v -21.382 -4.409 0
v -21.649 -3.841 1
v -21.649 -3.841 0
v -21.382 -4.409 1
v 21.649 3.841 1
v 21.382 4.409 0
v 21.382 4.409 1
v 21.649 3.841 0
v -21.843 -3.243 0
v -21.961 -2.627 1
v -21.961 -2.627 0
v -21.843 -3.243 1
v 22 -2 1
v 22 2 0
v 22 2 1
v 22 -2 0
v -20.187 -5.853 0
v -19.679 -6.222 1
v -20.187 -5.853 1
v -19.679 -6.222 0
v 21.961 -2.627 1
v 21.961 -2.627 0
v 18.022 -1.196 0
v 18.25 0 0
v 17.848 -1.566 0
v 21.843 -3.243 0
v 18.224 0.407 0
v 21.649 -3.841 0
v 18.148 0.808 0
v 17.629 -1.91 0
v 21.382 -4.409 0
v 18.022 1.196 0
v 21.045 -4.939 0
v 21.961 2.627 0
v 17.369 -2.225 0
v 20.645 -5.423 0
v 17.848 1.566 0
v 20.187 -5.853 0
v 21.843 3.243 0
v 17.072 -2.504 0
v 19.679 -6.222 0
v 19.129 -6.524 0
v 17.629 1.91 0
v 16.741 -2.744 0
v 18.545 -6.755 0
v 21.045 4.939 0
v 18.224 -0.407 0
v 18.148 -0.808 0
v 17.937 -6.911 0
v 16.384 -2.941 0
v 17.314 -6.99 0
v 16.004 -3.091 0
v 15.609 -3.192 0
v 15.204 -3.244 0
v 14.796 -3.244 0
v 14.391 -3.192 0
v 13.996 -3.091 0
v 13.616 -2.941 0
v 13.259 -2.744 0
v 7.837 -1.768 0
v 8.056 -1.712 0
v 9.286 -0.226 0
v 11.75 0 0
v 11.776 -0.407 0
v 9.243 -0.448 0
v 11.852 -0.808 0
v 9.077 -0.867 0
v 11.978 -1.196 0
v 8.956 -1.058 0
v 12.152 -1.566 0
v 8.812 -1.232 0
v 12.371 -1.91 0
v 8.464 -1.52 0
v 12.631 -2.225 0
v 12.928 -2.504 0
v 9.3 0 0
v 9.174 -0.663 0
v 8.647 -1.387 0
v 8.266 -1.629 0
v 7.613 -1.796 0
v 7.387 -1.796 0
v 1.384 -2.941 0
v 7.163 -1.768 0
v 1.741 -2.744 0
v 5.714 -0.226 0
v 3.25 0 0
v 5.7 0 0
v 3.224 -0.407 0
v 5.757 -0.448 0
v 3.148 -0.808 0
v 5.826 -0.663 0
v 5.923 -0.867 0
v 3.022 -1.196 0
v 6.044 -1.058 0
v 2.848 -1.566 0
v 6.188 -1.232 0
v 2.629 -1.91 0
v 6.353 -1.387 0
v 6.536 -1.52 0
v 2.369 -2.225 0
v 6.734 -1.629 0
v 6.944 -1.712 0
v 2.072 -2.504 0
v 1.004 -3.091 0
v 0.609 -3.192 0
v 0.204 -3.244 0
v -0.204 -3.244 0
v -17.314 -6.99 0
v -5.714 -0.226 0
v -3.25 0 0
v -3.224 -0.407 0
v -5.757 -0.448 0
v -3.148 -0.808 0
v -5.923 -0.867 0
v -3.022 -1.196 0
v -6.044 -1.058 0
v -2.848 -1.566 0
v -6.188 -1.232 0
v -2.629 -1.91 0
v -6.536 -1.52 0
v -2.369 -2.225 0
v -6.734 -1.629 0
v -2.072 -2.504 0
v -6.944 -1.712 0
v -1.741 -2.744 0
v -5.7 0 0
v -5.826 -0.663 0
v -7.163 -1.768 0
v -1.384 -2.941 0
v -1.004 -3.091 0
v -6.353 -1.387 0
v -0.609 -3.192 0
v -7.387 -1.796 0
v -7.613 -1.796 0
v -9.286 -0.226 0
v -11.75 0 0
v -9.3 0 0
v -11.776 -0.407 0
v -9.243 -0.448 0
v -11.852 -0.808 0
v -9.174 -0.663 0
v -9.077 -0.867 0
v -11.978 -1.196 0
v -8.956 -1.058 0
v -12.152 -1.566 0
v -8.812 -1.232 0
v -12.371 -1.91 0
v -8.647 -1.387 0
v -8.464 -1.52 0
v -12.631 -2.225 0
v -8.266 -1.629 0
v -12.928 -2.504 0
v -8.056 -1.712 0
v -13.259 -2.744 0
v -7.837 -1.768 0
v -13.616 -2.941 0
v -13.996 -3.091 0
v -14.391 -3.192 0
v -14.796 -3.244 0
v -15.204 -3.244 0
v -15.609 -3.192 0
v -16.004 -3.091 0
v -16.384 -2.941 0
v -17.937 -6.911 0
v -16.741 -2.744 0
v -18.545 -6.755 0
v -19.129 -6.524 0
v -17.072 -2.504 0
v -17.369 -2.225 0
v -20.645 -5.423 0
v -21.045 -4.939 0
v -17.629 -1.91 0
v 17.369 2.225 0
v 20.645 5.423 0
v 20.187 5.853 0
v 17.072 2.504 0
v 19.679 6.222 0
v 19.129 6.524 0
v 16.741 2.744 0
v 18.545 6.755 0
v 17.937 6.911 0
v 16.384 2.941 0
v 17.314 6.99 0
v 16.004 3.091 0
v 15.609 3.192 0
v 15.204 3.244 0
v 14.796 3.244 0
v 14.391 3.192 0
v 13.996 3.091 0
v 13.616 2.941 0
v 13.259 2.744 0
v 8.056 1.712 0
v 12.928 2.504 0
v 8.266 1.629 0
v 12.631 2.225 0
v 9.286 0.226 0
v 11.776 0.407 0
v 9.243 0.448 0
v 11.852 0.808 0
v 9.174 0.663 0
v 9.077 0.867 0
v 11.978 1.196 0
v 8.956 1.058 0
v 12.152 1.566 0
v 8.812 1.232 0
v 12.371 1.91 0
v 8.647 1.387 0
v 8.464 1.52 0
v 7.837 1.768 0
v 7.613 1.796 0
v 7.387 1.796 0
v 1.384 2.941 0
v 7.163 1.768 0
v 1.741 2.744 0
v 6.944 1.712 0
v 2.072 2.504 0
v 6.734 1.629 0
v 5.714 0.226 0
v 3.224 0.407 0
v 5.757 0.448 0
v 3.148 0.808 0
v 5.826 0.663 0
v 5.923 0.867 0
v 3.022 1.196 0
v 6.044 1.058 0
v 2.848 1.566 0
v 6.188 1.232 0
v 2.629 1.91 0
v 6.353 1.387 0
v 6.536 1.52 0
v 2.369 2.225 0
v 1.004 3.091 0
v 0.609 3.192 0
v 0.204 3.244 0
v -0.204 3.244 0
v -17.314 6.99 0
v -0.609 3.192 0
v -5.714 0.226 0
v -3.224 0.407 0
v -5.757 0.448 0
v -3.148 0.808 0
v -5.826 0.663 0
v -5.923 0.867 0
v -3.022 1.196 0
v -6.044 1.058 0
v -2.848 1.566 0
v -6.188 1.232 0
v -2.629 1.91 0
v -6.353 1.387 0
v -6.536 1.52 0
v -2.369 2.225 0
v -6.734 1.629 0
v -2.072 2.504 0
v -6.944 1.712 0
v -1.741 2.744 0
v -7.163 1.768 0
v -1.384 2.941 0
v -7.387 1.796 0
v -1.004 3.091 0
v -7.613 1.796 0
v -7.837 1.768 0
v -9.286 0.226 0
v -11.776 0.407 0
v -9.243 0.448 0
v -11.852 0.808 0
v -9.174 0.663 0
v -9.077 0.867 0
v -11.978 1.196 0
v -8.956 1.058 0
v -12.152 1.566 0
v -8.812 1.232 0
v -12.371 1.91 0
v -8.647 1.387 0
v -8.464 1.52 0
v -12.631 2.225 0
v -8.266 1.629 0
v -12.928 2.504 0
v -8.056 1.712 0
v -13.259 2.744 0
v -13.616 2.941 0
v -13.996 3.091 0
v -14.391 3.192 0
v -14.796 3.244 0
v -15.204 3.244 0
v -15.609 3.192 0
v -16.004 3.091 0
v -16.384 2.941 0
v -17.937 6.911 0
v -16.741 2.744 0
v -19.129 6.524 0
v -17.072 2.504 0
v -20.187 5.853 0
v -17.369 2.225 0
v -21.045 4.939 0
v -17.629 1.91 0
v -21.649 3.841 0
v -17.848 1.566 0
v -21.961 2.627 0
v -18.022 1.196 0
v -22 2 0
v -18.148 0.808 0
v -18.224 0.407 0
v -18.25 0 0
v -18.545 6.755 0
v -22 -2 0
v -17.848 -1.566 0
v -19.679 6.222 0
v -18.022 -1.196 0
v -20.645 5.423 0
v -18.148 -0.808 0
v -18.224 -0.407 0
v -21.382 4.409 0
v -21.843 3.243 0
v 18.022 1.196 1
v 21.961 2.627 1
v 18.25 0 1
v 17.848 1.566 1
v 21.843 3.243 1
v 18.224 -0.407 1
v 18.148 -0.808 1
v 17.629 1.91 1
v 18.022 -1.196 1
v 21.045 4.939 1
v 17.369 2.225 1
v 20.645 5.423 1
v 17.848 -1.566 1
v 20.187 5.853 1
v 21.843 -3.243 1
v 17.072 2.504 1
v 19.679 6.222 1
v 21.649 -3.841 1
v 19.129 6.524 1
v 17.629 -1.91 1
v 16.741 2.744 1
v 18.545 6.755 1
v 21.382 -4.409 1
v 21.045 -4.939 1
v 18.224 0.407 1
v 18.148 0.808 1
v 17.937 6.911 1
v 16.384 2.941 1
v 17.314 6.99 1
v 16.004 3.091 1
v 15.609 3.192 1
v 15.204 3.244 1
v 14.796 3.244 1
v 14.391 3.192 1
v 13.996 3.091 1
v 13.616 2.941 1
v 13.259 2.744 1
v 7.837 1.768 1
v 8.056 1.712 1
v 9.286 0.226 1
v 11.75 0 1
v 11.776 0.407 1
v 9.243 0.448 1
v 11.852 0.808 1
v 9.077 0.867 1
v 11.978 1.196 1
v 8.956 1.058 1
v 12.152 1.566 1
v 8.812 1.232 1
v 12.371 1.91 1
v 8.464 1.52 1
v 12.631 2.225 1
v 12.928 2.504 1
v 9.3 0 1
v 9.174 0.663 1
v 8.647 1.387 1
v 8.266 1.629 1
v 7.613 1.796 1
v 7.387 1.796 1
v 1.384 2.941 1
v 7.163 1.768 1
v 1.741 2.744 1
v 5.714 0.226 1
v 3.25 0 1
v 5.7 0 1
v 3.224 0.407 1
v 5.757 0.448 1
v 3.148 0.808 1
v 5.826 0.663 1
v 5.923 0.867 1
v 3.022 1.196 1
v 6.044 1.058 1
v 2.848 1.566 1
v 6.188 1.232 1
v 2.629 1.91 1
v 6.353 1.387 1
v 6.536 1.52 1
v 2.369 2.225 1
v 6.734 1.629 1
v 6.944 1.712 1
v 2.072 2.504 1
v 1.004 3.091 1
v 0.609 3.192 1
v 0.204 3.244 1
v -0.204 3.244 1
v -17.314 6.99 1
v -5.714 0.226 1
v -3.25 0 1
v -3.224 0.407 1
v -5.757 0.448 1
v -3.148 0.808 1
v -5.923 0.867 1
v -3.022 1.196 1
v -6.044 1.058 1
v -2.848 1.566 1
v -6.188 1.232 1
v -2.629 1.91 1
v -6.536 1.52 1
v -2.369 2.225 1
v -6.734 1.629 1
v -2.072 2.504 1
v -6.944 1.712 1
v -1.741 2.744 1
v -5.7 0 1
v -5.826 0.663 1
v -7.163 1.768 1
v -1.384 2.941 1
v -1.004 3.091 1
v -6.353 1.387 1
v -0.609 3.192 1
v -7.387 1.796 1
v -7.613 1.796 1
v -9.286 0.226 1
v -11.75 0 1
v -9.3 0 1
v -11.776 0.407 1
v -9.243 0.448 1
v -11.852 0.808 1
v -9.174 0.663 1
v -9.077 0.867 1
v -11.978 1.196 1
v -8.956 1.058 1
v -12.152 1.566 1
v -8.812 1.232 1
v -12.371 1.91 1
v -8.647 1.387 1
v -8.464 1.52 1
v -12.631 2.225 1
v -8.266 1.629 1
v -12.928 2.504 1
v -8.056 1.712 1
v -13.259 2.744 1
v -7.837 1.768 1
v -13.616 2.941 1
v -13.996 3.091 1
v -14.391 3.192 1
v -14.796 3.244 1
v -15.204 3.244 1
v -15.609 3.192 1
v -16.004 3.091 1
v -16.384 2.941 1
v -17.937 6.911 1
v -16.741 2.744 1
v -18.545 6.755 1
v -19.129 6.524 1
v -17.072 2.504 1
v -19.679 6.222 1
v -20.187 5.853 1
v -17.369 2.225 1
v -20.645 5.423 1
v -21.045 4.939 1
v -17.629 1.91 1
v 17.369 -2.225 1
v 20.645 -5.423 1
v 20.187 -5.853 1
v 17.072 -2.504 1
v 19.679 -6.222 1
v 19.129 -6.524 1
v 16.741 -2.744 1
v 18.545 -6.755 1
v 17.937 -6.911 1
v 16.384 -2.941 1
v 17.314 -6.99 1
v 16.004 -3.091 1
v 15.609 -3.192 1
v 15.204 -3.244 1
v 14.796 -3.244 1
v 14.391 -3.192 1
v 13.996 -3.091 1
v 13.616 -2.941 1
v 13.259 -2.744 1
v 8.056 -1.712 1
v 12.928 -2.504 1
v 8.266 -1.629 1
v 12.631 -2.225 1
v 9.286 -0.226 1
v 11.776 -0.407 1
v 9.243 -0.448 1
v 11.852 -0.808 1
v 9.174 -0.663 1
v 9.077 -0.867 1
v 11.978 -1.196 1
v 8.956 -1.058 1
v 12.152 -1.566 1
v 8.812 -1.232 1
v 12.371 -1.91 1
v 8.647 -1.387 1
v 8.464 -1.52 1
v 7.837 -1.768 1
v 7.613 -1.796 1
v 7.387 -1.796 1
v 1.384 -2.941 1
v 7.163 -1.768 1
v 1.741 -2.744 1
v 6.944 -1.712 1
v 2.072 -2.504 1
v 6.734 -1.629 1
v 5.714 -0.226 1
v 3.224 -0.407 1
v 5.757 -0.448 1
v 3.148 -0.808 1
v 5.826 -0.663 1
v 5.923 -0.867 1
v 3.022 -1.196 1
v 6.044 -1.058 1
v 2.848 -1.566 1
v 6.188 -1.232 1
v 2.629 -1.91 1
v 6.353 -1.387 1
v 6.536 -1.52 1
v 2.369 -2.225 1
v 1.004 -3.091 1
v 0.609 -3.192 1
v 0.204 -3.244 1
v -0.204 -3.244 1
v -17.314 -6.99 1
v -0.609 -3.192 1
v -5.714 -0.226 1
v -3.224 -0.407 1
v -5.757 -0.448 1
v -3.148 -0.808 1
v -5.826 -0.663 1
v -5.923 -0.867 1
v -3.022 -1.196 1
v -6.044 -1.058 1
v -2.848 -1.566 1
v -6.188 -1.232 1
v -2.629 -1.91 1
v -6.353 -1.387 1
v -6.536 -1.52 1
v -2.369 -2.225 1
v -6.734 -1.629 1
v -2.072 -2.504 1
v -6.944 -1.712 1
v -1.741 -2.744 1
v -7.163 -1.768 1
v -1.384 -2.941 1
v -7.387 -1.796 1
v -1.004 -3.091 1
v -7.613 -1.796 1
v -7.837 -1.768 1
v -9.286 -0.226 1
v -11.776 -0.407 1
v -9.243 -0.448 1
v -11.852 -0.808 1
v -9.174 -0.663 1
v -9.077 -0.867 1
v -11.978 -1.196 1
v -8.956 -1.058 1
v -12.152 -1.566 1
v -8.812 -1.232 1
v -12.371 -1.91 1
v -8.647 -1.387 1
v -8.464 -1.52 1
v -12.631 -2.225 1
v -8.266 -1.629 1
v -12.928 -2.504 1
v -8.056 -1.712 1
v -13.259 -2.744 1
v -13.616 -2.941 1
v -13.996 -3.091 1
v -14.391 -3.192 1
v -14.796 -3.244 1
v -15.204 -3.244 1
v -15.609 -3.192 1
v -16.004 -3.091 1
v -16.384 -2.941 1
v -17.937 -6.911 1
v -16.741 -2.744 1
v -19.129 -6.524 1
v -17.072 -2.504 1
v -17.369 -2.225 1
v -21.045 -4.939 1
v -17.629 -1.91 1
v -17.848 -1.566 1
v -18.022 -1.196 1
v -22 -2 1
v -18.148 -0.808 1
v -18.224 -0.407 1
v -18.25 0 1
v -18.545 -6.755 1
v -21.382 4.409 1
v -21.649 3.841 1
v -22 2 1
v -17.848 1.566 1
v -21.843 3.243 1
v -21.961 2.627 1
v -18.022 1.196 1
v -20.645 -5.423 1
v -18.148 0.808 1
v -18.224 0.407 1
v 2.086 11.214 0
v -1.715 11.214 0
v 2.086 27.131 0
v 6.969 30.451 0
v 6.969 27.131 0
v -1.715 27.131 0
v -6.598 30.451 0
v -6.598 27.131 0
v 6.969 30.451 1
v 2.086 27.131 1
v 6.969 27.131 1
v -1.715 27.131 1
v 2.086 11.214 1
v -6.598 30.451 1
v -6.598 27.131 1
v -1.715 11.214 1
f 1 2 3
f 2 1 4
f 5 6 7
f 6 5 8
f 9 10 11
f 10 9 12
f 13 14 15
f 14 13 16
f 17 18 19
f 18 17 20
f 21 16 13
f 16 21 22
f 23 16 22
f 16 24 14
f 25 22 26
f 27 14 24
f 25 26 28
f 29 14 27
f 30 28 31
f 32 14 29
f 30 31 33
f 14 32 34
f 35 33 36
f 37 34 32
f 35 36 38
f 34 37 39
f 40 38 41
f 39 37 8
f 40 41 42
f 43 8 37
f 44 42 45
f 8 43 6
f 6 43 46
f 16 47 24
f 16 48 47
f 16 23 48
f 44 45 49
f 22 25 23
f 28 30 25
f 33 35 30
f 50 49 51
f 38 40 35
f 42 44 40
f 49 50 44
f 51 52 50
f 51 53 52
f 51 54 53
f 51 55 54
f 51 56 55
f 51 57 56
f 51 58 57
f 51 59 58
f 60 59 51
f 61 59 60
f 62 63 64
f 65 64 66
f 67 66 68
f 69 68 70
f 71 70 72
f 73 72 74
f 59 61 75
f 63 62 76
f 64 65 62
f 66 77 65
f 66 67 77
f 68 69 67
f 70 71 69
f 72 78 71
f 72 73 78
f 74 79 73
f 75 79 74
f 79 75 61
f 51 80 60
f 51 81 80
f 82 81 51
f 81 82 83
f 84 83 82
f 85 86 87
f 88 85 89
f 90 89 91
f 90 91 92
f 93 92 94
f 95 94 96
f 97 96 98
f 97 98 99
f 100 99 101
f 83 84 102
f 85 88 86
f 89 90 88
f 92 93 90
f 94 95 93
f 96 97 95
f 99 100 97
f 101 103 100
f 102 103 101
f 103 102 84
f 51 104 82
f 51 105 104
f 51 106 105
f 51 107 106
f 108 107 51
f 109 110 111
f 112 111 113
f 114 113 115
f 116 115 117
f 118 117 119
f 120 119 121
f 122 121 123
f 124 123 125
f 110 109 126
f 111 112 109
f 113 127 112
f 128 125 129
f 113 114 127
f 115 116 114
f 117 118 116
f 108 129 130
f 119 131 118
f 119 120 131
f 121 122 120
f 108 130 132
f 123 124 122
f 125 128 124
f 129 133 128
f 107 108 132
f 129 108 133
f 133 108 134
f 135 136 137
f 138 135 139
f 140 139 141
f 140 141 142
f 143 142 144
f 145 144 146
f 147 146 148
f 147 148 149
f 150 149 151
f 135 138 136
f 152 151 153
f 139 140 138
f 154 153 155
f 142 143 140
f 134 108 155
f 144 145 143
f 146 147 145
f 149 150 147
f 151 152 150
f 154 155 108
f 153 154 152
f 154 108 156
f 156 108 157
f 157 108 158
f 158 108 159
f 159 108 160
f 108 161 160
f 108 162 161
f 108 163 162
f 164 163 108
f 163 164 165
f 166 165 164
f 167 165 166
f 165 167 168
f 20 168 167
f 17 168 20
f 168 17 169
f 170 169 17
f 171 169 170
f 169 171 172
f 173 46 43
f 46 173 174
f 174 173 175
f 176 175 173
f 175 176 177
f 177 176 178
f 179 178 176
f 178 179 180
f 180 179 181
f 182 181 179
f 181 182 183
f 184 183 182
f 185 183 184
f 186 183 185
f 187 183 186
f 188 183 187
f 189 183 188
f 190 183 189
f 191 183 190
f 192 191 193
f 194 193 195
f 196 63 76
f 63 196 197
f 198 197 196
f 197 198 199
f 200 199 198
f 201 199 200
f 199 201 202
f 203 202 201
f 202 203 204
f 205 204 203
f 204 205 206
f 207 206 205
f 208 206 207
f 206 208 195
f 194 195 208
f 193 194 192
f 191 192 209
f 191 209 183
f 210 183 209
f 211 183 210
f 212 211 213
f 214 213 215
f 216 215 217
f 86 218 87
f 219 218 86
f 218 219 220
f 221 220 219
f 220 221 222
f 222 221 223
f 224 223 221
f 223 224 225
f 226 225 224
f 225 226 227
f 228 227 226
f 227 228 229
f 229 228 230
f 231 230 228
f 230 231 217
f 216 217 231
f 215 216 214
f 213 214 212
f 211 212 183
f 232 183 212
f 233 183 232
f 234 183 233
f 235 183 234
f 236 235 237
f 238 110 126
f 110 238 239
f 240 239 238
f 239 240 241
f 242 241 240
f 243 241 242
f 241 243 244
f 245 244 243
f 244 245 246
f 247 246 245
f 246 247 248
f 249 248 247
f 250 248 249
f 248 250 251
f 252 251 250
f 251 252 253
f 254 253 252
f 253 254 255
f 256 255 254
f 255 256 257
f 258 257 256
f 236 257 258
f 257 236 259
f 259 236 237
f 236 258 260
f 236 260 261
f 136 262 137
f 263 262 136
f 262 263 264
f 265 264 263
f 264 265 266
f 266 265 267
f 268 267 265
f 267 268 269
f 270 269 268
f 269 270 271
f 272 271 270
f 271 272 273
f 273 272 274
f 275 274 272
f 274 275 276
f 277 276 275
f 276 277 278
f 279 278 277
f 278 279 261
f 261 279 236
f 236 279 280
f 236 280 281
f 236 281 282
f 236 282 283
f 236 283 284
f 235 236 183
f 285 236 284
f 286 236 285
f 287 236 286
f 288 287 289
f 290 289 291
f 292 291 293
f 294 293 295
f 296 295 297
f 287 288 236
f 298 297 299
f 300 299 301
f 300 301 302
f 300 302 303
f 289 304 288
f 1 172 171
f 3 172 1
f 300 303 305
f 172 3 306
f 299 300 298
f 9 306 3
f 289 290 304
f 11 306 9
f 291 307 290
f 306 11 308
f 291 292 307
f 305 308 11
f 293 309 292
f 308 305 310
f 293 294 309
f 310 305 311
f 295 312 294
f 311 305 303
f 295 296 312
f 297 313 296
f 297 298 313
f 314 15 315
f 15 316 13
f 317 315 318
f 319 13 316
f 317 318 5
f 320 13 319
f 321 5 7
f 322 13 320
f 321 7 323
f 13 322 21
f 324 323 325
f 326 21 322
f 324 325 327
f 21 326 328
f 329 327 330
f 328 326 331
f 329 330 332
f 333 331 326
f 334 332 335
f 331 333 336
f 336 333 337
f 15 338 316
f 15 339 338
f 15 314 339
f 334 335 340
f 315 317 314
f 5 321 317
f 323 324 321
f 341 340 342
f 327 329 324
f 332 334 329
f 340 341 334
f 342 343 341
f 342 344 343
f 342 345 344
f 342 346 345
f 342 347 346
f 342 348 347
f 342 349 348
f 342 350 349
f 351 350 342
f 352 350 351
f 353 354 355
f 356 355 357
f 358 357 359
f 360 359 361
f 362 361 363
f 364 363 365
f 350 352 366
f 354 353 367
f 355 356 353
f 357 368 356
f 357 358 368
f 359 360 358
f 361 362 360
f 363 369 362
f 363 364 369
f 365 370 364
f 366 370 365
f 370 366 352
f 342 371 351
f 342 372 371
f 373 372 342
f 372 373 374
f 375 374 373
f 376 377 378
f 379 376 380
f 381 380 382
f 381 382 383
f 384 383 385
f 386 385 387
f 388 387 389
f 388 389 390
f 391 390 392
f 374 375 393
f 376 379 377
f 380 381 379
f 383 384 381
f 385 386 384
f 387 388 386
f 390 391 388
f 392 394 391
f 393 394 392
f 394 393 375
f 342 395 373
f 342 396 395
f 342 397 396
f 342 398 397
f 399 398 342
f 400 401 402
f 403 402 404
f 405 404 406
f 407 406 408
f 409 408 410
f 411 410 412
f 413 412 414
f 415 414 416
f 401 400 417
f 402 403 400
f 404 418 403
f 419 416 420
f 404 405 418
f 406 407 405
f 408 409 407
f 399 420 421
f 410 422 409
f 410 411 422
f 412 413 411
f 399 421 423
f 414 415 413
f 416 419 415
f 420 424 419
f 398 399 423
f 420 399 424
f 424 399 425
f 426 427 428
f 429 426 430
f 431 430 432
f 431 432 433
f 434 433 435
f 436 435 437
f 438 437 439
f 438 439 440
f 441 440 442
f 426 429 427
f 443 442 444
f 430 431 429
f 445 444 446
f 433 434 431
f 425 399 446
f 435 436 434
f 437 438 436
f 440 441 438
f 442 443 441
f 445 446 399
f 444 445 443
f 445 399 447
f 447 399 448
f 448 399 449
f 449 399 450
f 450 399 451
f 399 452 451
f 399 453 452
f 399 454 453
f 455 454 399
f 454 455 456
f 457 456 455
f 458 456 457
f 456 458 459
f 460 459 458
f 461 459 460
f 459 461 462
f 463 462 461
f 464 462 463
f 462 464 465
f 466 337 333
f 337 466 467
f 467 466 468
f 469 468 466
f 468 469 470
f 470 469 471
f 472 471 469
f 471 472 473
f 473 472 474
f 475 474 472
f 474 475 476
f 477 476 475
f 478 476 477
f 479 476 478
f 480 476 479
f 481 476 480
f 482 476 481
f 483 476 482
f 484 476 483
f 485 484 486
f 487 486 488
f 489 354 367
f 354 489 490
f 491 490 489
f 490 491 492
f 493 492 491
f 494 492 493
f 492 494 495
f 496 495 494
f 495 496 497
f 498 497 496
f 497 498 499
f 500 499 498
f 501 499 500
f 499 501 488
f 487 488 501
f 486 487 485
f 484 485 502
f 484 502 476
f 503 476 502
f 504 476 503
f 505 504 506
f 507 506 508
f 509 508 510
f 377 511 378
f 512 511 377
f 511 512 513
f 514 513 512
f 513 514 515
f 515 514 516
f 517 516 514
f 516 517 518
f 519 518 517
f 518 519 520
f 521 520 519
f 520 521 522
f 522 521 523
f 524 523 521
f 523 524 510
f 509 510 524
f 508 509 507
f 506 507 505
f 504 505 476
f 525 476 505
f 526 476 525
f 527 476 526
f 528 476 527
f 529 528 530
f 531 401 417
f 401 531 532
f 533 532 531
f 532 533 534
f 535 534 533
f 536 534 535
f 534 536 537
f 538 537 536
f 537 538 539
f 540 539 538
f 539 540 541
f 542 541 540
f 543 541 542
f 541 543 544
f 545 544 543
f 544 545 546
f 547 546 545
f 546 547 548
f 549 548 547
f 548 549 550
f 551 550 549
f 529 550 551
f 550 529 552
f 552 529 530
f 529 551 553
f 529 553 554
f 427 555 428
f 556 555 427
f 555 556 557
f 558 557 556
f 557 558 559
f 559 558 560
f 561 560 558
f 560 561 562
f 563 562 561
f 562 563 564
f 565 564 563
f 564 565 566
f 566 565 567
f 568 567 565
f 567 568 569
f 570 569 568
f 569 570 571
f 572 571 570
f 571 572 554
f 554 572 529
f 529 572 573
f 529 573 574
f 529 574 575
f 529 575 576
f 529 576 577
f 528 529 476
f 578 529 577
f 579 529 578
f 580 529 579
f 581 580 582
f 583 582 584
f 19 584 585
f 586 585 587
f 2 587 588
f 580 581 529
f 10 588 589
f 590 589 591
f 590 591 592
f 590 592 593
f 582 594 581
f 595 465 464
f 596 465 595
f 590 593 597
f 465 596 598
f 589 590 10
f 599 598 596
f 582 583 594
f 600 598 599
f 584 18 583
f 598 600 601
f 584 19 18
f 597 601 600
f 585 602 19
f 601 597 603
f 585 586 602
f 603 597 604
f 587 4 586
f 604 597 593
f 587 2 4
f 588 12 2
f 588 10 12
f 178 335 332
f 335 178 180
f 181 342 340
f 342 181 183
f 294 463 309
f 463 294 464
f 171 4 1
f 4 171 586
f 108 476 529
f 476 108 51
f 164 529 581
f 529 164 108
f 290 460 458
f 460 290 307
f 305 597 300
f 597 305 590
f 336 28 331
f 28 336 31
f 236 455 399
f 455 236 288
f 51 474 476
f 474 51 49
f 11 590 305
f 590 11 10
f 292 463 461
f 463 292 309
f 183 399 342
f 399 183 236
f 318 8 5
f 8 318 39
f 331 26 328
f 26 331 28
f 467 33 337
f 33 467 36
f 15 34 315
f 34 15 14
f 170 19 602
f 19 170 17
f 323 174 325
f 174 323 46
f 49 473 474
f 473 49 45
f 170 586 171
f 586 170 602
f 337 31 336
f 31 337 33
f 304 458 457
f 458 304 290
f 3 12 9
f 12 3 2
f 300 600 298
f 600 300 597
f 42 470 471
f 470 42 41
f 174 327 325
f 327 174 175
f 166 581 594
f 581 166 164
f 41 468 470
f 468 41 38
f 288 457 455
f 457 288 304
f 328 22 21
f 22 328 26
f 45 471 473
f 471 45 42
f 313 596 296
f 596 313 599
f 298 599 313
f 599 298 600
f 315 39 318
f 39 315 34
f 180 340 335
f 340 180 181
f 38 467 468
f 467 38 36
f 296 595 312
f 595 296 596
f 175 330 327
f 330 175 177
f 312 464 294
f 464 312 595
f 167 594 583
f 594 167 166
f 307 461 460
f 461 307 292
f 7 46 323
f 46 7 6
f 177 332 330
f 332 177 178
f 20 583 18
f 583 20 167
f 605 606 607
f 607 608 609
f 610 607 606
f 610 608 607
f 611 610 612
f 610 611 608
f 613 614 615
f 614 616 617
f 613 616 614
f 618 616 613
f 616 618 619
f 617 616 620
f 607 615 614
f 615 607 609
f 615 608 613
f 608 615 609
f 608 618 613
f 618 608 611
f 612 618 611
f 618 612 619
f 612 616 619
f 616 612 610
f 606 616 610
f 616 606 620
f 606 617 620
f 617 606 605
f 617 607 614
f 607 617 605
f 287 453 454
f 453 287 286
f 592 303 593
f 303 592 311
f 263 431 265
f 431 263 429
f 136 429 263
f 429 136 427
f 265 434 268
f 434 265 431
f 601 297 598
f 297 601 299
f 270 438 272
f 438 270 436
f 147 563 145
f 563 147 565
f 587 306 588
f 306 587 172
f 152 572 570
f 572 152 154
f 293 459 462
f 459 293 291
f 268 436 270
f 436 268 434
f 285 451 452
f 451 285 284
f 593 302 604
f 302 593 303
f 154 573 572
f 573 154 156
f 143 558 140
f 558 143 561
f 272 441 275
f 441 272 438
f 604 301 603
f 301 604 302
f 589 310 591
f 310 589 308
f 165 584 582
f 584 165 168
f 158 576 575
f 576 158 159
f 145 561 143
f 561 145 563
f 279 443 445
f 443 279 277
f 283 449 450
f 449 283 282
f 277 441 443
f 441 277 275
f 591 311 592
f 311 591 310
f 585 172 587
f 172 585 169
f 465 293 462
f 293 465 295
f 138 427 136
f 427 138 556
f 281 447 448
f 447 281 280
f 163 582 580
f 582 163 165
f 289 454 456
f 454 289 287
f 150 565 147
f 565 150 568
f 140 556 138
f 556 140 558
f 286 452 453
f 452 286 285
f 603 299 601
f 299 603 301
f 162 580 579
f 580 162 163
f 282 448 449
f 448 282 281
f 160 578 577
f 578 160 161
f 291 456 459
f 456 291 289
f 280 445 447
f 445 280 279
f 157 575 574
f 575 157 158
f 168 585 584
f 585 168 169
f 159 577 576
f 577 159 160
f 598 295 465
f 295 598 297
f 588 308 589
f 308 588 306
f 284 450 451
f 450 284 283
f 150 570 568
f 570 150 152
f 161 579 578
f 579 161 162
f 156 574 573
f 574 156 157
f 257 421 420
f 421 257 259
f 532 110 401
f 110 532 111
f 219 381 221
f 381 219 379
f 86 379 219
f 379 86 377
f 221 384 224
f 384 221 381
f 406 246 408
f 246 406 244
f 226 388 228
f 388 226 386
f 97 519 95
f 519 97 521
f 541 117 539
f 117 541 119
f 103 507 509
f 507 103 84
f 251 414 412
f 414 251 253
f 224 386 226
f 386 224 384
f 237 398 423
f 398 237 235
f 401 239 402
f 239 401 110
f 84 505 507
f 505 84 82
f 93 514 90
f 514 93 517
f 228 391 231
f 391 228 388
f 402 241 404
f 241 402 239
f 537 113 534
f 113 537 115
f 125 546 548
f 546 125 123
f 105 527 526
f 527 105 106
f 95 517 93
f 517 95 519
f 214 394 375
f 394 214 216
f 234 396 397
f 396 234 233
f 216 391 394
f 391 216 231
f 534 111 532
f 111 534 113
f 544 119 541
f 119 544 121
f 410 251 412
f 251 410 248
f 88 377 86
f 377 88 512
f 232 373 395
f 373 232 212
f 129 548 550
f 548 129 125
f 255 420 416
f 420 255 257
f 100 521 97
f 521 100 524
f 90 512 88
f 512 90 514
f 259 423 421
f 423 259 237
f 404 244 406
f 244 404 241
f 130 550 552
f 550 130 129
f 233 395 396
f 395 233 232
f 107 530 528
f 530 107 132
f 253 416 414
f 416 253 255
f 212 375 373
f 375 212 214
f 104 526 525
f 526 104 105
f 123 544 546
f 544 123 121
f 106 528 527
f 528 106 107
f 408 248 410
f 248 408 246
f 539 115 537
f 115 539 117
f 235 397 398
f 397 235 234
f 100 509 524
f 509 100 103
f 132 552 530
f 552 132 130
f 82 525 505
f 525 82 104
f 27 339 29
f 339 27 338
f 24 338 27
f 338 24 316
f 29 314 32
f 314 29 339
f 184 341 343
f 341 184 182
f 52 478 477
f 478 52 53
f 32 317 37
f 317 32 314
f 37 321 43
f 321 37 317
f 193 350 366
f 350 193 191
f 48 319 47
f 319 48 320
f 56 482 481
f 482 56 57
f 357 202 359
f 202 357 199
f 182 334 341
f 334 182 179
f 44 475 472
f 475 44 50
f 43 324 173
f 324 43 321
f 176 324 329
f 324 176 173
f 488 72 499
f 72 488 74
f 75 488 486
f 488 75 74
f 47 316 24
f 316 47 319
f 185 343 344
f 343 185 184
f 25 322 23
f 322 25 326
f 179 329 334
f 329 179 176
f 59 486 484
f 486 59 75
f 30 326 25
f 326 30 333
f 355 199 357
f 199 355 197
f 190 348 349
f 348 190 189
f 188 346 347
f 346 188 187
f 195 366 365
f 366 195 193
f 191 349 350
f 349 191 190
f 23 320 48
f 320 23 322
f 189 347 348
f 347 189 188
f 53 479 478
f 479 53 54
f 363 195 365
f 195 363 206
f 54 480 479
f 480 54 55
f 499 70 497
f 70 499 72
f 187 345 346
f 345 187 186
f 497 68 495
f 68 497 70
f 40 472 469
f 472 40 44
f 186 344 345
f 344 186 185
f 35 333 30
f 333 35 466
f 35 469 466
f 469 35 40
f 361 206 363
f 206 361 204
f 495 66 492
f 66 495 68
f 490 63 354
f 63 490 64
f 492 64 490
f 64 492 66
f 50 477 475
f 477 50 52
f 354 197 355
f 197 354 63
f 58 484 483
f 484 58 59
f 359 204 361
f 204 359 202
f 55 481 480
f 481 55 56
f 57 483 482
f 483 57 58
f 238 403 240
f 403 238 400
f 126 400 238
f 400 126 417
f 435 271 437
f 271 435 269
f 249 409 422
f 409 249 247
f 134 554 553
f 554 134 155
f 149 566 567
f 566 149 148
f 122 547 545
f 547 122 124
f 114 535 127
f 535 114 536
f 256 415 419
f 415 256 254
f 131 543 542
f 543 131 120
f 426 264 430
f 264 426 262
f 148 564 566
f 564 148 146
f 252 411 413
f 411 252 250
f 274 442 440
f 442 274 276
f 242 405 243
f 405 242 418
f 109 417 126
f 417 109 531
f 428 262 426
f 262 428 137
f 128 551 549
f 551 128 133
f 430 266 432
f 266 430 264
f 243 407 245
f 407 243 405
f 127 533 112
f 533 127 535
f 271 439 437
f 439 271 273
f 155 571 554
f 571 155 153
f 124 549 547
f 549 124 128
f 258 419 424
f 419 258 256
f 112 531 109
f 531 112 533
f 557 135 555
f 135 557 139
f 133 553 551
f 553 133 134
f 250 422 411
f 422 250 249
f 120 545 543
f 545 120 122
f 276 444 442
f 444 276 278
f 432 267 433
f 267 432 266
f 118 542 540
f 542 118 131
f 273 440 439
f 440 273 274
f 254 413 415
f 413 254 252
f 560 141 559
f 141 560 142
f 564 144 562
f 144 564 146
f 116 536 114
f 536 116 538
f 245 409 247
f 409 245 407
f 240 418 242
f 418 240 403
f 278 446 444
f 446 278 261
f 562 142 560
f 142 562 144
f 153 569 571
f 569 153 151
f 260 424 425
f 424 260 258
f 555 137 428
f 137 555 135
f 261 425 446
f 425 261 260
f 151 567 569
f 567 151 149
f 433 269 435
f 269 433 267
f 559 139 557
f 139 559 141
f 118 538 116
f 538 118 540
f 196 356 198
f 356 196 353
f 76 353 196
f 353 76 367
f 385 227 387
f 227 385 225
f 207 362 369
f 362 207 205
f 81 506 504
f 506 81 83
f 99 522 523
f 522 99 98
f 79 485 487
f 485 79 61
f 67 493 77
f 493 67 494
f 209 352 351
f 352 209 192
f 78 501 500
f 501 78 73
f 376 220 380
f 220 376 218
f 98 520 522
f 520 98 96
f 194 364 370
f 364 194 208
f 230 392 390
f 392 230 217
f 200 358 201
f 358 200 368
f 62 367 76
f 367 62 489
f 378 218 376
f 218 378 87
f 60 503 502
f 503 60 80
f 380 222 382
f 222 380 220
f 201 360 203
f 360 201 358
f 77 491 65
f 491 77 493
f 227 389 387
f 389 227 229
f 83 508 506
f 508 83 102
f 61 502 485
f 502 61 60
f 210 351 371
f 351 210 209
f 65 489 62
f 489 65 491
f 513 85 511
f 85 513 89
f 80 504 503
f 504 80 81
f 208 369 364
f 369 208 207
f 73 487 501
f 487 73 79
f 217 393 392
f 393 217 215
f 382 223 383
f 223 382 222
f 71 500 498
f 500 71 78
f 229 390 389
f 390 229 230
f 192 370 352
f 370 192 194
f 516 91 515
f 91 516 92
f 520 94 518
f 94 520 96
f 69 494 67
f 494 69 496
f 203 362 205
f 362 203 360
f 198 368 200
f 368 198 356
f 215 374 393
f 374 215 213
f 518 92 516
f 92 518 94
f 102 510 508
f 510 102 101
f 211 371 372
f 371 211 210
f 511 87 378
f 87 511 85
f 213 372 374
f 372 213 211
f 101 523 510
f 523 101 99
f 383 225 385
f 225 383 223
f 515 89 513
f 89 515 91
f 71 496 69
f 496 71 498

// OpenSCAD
$fn = 50;


difference() {
	union() {
		hull() {
			translate(v = [-17.0000000000, 2.0000000000, 0]) {
				cylinder(h = 1, r = 5);
			}
			translate(v = [17.0000000000, 2.0000000000, 0]) {
				cylinder(h = 1, r = 5);
			}
			translate(v = [-17.0000000000, -2.0000000000, 0]) {
				cylinder(h = 1, r = 5);
			}
			translate(v = [17.0000000000, -2.0000000000, 0]) {
				cylinder(h = 1, r = 5);
			}
		}
		translate(v = [0, 30.0000000000, 0]) {
			linear_extrude(height = 1) {
				text(font = "DejaVu Sans Mono:style=Bold", halign = "center", size = 19.0000000000, text = "T", valign = "top");
			}
		}
	}
	union() {
		translate(v = [-15.0000000000, 0.0000000000, 0]) {
			translate(v = [0, 0, -100]) {
				cylinder(h = 200, r = 3.2500000000);
			}
		}
		translate(v = [0, 0, -100]) {
			cylinder(h = 200, r = 3.2500000000);
		}
		translate(v = [15.0000000000, 0.0000000000, 0]) {
			translate(v = [0, 0, -100]) {
				cylinder(h = 200, r = 3.2500000000);
			}
		}
		translate(v = [-15.0000000000, 0.0000000000, 0]) {
			translate(v = [0, 0, -100]) {
				cylinder(h = 200, r = 1.8000000000);
			}
		}
		translate(v = [-7.5000000000, 0.0000000000, 0]) {
			translate(v = [0, 0, -100]) {
				cylinder(h = 200, r = 1.8000000000);
			}
		}
		translate(v = [0, 0, -100]) {
			cylinder(h = 200, r = 1.8000000000);
		}
		translate(v = [7.5000000000, 0.0000000000, 0]) {
			translate(v = [0, 0, -100]) {
				cylinder(h = 200, r = 1.8000000000);
			}
		}
		translate(v = [15.0000000000, 0.0000000000, 0]) {
			translate(v = [0, 0, -100]) {
				cylinder(h = 200, r = 1.8000000000);
			}
		}
	}
}
